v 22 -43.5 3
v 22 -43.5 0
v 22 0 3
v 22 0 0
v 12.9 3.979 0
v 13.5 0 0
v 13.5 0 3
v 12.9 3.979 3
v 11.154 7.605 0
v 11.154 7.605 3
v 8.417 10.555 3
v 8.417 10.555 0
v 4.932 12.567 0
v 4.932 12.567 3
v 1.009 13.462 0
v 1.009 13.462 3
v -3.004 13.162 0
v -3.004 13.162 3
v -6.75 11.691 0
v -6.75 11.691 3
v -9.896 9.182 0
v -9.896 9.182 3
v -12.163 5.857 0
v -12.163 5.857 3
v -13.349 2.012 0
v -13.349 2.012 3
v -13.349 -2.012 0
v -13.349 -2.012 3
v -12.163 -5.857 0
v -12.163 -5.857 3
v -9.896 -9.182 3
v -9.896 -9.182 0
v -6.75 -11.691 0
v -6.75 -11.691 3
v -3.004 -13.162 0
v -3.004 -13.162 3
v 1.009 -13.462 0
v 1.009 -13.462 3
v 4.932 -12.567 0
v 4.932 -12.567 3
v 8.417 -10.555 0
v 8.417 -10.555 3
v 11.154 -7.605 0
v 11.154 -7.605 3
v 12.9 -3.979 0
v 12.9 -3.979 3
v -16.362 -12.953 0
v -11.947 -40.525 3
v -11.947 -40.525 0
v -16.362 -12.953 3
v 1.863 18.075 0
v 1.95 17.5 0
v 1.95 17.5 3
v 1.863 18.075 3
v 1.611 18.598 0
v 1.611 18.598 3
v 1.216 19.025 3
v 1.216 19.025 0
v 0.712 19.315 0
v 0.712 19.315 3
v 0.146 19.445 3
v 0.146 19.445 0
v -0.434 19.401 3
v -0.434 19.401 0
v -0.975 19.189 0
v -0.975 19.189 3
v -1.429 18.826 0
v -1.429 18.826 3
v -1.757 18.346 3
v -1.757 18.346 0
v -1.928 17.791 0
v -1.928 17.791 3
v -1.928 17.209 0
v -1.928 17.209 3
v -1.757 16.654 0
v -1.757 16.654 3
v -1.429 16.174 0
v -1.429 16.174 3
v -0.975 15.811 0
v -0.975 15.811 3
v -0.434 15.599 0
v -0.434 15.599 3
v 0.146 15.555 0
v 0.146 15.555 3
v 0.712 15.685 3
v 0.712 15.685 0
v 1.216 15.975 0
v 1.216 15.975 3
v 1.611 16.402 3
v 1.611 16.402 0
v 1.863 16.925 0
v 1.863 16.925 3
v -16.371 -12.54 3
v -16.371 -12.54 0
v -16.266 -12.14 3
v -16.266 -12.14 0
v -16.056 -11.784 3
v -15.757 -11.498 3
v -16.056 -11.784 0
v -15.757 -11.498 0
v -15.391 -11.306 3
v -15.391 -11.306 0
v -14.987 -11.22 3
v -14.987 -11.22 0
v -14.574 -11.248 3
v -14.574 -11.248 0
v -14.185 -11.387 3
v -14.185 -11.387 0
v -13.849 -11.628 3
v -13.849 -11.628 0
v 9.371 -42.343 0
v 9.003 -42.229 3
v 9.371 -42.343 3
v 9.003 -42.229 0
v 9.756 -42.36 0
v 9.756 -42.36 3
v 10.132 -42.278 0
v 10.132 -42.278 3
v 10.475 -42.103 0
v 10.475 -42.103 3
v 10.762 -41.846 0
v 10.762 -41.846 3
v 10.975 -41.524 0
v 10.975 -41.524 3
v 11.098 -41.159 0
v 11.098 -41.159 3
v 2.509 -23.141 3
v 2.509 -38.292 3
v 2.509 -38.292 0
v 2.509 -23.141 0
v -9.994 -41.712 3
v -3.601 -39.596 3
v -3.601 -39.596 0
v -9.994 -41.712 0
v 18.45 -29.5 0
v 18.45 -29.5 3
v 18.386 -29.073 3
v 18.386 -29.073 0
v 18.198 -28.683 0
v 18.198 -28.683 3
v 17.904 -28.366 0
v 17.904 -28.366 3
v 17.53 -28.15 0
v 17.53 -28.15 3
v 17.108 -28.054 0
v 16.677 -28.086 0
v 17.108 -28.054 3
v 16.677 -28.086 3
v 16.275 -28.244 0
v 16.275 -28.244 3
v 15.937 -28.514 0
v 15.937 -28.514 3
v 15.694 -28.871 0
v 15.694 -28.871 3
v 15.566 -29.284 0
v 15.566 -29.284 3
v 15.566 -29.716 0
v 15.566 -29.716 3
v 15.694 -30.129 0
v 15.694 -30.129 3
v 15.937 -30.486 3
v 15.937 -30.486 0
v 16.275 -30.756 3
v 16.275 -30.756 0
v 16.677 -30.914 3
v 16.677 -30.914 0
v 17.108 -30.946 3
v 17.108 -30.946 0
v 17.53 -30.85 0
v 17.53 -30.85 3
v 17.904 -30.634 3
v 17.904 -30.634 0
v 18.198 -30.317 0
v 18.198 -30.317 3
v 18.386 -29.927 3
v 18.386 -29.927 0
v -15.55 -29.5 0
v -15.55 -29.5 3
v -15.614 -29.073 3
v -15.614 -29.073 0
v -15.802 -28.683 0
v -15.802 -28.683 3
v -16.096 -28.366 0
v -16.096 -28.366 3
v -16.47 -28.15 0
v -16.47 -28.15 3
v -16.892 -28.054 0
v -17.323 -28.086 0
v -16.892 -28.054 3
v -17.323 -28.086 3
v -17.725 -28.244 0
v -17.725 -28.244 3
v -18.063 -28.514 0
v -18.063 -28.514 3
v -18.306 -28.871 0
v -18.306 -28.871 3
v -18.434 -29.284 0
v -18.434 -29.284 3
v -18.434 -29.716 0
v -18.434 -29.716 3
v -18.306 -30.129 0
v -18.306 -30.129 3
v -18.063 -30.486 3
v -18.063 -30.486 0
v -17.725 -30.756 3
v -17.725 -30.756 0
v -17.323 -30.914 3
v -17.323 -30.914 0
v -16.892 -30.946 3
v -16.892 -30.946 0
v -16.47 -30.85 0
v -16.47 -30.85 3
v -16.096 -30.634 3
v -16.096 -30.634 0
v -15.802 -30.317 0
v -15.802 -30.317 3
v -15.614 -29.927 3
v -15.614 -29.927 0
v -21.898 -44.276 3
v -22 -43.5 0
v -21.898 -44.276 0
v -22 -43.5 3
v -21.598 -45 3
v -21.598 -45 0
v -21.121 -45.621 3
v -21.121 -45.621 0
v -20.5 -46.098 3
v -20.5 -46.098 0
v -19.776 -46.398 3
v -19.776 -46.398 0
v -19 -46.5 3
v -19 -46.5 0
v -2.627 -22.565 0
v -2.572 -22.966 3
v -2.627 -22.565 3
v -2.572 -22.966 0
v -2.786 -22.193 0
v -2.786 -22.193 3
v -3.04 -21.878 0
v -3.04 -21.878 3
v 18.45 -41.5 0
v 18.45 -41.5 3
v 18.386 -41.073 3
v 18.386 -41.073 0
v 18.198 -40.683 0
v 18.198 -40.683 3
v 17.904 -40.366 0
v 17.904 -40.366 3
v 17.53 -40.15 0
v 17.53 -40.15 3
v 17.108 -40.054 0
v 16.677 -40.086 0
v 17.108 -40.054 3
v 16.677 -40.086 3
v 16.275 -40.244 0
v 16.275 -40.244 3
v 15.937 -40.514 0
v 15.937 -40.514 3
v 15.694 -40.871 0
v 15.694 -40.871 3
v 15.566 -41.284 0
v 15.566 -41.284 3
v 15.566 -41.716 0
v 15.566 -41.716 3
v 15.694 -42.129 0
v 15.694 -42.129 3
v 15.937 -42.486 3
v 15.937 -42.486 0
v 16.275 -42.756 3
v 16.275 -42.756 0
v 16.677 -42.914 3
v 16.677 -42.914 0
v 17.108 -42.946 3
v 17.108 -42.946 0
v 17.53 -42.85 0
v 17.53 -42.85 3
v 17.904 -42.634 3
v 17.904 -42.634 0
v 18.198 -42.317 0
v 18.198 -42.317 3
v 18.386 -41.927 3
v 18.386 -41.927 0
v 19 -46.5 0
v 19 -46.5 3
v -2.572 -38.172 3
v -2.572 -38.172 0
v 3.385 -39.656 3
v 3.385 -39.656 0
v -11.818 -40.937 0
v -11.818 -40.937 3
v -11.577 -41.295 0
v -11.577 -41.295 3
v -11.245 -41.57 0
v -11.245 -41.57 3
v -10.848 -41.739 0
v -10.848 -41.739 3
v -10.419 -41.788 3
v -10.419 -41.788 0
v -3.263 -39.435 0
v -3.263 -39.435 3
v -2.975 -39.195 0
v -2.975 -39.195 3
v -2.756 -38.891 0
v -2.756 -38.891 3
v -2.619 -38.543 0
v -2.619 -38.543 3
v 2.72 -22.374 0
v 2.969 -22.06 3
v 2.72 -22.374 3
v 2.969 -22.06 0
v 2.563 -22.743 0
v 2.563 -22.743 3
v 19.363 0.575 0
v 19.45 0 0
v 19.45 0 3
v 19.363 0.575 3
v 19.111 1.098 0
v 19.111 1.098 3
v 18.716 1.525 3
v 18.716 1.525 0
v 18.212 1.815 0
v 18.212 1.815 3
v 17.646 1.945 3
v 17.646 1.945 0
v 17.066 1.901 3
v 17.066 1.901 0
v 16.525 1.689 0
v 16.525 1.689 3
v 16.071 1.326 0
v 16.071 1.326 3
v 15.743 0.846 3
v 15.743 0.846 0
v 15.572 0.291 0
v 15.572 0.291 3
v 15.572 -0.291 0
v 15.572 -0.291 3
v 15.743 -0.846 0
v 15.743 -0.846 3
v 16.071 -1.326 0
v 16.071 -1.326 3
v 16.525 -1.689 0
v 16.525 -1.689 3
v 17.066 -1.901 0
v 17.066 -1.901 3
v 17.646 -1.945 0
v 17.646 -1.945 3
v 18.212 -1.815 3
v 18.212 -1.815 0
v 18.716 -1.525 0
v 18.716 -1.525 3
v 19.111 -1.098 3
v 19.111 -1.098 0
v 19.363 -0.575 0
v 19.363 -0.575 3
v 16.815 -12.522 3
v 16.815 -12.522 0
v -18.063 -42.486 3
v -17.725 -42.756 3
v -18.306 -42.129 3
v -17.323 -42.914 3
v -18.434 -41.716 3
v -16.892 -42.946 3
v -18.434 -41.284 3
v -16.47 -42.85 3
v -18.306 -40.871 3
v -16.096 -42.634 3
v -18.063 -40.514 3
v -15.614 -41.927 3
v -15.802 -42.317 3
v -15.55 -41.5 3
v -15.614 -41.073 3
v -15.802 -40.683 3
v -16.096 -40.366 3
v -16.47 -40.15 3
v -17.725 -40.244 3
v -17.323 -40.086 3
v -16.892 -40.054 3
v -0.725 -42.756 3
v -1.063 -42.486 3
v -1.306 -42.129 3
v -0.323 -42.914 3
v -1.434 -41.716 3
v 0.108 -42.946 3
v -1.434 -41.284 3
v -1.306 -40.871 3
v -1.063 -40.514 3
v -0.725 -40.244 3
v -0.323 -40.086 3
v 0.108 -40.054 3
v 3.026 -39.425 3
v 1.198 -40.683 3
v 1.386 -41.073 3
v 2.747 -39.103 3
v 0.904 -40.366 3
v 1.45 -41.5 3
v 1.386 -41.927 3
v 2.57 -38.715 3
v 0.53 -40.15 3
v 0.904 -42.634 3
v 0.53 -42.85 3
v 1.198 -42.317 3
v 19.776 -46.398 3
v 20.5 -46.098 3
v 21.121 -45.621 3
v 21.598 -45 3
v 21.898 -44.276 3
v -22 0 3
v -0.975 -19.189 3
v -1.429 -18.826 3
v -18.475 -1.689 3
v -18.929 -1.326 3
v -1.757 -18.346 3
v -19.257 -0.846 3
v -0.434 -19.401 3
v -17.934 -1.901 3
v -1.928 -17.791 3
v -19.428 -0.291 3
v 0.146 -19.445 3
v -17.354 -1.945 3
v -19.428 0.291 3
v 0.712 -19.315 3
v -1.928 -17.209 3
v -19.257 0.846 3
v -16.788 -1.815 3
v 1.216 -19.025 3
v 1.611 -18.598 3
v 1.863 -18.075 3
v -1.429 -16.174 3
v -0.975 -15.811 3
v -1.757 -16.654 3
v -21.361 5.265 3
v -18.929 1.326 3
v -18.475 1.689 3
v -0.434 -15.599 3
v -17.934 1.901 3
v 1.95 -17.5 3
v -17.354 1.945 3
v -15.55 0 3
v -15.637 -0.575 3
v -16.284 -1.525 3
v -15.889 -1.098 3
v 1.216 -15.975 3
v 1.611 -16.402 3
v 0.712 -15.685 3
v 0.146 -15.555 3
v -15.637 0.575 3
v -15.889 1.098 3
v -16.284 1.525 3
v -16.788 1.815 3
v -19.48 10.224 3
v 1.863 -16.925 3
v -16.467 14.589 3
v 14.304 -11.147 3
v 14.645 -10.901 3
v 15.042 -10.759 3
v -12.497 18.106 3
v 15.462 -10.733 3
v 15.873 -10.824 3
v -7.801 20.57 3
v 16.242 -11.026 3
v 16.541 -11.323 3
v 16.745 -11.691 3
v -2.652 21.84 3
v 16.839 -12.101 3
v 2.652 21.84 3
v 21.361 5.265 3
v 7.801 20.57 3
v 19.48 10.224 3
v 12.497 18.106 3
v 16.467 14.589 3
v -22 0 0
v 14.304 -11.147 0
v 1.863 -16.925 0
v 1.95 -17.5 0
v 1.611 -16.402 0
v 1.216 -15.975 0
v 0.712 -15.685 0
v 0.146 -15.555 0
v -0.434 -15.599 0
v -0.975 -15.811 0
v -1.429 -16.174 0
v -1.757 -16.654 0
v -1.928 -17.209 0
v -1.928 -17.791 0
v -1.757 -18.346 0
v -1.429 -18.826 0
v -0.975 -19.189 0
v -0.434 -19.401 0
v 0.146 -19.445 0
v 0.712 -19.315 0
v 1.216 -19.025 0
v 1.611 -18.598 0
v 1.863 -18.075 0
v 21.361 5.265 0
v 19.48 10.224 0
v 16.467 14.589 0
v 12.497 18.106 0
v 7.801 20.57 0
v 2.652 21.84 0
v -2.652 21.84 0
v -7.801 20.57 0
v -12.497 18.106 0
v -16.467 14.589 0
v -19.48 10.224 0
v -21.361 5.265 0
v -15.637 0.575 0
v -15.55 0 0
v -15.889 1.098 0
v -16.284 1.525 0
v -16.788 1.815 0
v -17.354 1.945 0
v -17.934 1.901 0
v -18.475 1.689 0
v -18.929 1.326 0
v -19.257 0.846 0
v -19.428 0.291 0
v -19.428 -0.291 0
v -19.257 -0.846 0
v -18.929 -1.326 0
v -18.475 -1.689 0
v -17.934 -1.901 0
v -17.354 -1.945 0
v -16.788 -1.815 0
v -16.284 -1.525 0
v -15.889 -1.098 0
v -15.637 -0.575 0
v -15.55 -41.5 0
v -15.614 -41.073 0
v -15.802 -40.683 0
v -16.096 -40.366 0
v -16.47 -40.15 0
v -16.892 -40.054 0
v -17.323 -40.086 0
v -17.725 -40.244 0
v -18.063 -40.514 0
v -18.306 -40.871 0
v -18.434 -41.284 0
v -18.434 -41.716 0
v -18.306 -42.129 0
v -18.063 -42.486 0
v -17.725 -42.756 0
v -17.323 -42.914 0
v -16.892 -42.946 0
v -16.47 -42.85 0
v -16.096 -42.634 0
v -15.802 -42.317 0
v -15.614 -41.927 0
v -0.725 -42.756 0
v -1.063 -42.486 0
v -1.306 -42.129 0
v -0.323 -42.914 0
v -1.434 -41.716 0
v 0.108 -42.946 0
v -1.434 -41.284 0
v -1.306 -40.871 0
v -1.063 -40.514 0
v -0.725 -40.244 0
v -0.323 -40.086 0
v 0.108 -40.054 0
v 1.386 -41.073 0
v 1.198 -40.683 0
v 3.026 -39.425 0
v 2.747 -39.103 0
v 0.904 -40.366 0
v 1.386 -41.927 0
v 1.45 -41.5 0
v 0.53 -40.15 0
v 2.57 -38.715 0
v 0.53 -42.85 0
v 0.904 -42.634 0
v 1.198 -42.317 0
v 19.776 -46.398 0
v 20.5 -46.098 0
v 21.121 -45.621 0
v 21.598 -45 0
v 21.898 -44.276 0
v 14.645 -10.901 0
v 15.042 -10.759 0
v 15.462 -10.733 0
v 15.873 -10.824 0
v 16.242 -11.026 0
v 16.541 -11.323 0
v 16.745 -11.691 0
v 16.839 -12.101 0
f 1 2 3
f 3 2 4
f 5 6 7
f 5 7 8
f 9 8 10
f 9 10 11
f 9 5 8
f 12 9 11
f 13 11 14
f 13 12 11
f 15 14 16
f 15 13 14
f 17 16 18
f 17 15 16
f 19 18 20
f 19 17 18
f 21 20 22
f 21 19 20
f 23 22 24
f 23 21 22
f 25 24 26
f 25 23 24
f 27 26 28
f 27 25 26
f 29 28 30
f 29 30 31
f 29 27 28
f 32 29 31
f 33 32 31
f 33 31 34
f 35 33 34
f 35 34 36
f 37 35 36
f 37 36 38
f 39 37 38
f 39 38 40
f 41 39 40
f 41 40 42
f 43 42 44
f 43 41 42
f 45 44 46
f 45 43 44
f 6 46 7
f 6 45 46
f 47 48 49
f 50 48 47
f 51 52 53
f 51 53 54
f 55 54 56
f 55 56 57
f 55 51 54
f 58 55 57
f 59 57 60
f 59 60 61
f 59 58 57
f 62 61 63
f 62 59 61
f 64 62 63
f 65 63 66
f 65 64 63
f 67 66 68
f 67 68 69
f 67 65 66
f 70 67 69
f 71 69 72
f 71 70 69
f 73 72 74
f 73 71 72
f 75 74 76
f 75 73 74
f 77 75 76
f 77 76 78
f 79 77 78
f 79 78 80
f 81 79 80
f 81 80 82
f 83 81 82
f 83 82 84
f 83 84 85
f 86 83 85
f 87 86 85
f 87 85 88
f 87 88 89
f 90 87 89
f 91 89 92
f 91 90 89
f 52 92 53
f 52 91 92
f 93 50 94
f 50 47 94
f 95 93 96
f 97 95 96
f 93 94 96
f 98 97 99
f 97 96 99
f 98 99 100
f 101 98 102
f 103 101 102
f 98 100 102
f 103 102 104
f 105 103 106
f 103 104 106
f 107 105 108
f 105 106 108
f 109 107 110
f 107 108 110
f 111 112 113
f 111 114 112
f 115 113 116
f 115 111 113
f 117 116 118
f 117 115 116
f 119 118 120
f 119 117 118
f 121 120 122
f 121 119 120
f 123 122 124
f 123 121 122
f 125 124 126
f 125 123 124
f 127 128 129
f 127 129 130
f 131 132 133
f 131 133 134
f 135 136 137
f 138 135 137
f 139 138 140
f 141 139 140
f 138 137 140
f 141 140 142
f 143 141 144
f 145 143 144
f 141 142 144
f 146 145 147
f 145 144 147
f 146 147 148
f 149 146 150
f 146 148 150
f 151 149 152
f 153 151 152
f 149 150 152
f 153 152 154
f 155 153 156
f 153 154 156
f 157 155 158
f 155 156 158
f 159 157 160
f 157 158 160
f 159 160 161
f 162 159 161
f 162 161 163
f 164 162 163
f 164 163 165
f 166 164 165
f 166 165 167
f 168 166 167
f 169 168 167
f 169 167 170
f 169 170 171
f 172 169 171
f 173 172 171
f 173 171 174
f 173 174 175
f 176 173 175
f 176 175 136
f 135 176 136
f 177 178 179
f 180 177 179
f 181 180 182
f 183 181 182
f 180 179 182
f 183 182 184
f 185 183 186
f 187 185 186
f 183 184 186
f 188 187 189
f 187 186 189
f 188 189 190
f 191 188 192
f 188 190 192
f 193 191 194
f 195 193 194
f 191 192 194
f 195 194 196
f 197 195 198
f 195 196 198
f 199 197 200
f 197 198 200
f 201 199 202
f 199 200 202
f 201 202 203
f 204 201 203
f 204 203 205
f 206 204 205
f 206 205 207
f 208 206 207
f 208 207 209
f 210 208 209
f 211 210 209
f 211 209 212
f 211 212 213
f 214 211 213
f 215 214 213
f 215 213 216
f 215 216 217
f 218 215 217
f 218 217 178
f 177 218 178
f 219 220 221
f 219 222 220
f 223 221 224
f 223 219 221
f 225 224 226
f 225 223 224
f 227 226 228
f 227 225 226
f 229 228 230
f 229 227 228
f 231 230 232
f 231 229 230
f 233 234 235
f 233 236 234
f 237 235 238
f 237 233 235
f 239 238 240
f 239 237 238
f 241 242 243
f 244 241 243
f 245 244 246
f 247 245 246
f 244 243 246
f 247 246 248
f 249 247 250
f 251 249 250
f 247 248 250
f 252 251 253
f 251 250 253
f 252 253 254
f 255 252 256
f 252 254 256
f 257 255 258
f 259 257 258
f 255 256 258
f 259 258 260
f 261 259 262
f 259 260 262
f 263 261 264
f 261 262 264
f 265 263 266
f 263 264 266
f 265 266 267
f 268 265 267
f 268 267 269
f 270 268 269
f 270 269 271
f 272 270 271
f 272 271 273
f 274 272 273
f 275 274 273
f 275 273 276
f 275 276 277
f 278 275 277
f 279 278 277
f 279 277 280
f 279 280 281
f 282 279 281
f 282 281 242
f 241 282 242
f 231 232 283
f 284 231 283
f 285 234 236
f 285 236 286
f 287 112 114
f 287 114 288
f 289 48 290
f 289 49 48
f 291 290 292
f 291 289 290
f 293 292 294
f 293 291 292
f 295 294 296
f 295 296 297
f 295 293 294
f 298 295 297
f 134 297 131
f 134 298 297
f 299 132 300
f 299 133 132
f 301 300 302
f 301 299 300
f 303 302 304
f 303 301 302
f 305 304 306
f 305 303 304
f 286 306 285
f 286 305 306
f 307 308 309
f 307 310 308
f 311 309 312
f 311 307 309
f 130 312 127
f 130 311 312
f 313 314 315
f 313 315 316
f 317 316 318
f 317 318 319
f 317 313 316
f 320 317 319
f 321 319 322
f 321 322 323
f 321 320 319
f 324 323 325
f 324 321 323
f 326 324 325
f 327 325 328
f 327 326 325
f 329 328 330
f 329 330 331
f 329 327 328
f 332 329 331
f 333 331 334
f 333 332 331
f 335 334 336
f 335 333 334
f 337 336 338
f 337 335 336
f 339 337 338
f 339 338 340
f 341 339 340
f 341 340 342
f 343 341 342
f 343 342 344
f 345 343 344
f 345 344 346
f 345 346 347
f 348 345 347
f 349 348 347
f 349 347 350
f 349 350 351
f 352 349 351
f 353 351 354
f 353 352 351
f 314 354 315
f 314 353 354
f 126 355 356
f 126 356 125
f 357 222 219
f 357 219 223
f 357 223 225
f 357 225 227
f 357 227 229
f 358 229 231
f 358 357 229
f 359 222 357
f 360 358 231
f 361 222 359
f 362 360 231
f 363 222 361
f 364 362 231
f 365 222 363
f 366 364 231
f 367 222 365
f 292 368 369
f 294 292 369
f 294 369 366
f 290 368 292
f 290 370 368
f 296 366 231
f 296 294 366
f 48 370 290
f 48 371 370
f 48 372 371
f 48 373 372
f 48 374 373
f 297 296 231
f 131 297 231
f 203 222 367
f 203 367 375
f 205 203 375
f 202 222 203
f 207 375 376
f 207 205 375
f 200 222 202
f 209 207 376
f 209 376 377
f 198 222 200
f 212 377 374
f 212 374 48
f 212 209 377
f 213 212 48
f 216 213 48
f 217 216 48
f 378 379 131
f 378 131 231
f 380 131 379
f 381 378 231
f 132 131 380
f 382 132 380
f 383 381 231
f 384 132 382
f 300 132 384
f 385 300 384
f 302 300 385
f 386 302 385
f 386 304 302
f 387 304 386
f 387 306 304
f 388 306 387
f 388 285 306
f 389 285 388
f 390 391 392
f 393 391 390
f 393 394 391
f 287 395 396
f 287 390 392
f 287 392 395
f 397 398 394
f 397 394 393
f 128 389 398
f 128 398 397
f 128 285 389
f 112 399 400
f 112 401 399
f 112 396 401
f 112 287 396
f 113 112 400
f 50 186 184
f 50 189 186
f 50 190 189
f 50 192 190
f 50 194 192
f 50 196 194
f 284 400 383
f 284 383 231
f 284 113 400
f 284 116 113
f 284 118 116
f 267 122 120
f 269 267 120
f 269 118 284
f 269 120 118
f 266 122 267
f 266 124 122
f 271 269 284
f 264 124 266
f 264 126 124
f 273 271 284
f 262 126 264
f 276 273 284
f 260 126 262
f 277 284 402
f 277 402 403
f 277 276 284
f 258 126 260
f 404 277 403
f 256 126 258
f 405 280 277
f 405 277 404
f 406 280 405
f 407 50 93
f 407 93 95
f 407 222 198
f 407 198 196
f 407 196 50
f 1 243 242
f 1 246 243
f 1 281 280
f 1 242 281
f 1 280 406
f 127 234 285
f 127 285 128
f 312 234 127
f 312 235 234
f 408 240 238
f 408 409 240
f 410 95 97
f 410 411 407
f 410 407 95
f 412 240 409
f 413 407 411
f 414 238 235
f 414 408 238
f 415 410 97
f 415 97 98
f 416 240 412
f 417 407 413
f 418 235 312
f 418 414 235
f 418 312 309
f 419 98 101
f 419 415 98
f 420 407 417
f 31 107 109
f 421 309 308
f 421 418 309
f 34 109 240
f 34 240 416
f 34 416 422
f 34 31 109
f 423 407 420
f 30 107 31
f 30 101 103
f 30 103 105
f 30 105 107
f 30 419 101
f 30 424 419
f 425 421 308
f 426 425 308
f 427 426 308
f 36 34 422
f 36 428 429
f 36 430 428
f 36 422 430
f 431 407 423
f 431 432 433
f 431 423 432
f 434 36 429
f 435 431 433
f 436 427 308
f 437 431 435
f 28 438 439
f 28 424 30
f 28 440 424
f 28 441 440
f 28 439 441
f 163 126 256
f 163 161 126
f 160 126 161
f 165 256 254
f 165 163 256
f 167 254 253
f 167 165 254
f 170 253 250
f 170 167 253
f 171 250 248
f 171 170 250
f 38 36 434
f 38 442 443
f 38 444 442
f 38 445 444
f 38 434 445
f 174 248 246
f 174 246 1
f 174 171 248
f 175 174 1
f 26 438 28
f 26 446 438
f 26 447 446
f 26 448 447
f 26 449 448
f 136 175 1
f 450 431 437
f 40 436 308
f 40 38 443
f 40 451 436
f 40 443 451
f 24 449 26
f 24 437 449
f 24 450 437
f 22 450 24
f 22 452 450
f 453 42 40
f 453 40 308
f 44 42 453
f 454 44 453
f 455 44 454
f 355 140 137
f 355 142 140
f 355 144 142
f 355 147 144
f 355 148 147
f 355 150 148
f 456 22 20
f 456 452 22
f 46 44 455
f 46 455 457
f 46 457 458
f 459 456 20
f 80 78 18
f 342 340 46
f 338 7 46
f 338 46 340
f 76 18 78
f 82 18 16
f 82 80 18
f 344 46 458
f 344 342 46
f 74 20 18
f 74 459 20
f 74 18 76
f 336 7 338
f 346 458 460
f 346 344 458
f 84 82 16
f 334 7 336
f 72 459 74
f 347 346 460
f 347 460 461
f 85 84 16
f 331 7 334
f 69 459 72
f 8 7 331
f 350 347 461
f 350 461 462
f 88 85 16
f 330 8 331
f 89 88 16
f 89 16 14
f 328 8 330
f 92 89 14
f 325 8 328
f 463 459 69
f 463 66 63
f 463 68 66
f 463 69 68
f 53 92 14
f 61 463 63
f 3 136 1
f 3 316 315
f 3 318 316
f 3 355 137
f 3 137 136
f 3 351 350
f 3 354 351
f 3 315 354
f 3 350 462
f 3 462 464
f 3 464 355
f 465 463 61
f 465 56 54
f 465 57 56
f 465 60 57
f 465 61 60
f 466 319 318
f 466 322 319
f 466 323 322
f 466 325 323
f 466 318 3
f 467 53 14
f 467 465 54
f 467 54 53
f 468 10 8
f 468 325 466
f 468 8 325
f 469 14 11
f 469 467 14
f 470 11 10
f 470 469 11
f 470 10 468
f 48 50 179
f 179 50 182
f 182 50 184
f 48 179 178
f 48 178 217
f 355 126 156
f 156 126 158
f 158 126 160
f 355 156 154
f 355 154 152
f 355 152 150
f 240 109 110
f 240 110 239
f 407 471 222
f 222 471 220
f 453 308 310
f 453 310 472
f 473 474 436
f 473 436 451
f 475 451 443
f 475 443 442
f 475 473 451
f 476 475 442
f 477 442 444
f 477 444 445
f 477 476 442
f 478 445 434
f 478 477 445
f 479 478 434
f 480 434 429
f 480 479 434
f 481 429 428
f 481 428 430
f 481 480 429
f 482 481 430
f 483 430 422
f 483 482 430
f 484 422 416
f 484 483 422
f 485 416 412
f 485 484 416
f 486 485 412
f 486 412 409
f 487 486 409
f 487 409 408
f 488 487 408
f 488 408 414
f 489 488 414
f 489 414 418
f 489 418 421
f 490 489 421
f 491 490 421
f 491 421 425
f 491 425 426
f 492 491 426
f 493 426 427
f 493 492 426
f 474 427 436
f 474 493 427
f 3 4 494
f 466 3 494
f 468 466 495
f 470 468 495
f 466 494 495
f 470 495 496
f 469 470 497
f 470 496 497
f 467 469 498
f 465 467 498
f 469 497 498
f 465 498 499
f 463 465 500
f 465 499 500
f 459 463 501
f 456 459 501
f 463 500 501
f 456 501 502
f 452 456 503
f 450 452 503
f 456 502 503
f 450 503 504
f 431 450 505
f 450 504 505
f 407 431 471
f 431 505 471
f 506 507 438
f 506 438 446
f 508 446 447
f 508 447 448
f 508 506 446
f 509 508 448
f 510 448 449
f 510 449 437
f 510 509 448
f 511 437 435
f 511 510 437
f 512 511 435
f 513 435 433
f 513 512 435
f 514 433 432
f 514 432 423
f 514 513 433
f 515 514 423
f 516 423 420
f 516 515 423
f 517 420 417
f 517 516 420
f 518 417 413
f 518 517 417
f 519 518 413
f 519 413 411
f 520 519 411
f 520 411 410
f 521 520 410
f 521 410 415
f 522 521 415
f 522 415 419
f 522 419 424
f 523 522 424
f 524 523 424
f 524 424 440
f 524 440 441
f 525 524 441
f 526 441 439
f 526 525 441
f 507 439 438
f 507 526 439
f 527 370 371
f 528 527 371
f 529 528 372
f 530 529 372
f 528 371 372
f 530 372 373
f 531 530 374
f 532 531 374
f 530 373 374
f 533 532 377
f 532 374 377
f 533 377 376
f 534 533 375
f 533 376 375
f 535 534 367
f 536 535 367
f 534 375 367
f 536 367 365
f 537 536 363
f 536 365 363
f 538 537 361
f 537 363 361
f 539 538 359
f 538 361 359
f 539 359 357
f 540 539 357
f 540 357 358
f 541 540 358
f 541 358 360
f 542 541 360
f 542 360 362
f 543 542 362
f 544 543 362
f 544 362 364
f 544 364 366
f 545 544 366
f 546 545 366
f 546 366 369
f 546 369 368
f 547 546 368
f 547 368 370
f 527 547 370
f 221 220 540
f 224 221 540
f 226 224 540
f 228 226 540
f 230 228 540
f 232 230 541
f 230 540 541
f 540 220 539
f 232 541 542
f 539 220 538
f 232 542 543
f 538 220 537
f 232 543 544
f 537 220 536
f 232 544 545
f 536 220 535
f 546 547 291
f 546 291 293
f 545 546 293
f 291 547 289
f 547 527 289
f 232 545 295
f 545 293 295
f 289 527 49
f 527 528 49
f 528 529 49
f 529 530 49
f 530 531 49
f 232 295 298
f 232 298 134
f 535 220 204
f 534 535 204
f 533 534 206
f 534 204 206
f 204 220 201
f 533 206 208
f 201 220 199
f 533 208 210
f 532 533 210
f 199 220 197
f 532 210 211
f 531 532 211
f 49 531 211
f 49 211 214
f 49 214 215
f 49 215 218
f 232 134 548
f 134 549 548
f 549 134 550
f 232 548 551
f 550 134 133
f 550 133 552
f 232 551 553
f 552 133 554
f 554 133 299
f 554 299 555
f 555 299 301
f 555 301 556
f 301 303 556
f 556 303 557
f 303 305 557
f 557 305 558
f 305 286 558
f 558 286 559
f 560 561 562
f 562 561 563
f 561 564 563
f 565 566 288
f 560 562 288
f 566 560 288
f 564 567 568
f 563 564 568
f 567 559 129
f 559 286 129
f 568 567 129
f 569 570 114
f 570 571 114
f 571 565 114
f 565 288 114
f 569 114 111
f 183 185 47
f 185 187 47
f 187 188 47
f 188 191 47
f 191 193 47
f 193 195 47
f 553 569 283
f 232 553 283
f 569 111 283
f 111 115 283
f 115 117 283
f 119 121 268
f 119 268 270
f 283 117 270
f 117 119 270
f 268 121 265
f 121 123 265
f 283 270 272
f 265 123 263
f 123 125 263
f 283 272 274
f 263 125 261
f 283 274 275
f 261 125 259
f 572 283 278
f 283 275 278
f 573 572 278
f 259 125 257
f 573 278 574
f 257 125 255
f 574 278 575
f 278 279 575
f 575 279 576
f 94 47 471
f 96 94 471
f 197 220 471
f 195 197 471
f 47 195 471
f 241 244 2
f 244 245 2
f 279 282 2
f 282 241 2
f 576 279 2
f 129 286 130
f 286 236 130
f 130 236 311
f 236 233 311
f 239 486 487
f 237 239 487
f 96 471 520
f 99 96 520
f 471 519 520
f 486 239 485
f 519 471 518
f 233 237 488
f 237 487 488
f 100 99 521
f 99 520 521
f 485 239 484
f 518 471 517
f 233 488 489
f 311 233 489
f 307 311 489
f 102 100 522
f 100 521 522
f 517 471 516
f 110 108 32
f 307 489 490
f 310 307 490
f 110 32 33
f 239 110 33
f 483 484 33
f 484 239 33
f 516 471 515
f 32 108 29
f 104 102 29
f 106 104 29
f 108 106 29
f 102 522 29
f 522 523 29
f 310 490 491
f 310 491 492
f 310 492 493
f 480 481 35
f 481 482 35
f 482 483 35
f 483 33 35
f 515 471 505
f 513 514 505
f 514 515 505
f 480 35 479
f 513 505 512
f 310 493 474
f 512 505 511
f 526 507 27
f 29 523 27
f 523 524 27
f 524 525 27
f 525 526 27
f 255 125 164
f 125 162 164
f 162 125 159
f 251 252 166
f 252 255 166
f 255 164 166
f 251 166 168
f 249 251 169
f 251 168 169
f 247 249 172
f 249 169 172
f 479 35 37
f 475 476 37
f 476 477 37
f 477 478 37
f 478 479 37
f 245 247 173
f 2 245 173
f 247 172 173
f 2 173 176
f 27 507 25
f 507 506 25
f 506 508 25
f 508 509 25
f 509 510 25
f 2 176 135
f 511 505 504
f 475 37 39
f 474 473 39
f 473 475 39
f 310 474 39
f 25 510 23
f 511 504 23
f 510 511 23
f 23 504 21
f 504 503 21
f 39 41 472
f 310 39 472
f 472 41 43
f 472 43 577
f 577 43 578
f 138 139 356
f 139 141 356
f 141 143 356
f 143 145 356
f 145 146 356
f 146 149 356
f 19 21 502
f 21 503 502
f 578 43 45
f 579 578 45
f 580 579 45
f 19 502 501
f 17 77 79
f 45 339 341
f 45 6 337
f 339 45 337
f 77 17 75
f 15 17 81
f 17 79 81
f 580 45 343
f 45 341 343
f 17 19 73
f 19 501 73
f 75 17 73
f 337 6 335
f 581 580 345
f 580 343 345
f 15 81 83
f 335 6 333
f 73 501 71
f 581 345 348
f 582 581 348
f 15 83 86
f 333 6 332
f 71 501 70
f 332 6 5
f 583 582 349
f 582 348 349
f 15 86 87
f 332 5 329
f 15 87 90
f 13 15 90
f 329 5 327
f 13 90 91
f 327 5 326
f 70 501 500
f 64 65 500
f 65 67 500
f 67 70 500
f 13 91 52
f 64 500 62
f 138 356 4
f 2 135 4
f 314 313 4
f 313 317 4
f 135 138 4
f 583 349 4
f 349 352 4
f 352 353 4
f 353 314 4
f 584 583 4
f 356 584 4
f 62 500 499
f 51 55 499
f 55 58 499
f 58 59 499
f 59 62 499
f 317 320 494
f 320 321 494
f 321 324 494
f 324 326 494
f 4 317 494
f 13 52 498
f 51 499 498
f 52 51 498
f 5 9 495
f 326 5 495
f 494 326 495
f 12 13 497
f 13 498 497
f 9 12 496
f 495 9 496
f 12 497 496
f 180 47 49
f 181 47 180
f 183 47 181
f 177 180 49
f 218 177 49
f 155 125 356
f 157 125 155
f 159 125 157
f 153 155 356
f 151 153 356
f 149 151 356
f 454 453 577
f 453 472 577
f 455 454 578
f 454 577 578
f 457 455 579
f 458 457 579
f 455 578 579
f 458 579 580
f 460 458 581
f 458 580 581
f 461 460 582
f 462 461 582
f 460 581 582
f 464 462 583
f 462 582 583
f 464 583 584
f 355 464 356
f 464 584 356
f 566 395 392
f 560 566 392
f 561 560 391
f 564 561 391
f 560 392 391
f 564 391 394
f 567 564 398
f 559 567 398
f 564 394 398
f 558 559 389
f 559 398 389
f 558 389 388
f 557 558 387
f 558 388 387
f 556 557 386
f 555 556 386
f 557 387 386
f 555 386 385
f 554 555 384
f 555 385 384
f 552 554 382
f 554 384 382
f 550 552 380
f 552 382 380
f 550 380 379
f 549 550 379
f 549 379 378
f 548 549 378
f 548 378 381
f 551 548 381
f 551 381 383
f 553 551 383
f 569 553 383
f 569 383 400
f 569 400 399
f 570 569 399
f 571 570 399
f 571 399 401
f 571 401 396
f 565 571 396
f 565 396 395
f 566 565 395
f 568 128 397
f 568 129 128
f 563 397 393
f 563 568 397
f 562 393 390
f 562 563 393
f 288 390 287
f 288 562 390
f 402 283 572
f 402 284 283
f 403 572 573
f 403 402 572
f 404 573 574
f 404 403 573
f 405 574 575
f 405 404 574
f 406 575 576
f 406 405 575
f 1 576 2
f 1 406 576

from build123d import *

# Parameters (mm, degrees)
SKETCH_1_R          = 13.5
SKETCH_1_R_2        = 1.95
EXTRUDE_1_DEPTH     = 3
SKETCH_2_R          = 1.45
CUT_EXTRUDE_1_DEPTH = 10
FILLET_1_R          = 3
CUT_EXTRUDE_2_DEPTH = 52.529117982
FILLET_2_R          = 1.5


with BuildPart() as part:
    # 草图1 → 凸台-拉伸1 (new body)
    with BuildSketch(Plane.XY):
        with BuildLine():
            Line((-22, 0), (-22, -46.5))
            Line((-22, -46.5), (22, -46.5))
            Line((22, -46.5), (22, 0))
            ThreePointArc((22, 0), (0, 22), (-22, 0))
        make_face()
        Circle(SKETCH_1_R, mode=Mode.SUBTRACT)
        with Locations((0, 17.5)):
            Circle(SKETCH_1_R_2, mode=Mode.SUBTRACT)
        with Locations((17.5, 0)):
            Circle(SKETCH_1_R_2, mode=Mode.SUBTRACT)
        with Locations((-17.5, 0)):
            Circle(SKETCH_1_R_2, mode=Mode.SUBTRACT)
        with Locations((0, -17.5)):
            Circle(SKETCH_1_R_2, mode=Mode.SUBTRACT)
    extrude(amount=EXTRUDE_1_DEPTH)

    # 草图2 → 切除-拉伸1 (cut)
    with BuildSketch(Plane.XY.offset(3)):
        with Locations((0, -41.5)):
            Circle(SKETCH_2_R)
        with Locations((17, -41.5)):
            Circle(SKETCH_2_R)
        with Locations((-17, -41.5)):
            Circle(SKETCH_2_R)
        with Locations((-17, -29.5)):
            Circle(SKETCH_2_R)
        with Locations((17, -29.5)):
            Circle(SKETCH_2_R)
    extrude(amount=-CUT_EXTRUDE_1_DEPTH, mode=Mode.SUBTRACT)

    # 圆角1
    fillet_1_edges = [part.edges().sort_by_distance(p)[0] for p in [
        (22, -46.5, 1.5),
        (-22, -46.5, 1.5),
    ]]
    fillet(fillet_1_edges, radius=FILLET_1_R)

    # 草图3 → 切除-拉伸2 (cut, through all)
    with BuildSketch(Plane.XY.offset(3)):
        Polygon((17.752585541, -7.827536111), (10.726827306, -43.019057271), (2.50919937, -39.255258217), (2.50919937, -22.502580513), align=None)
        Polygon((-17.062555714, -8.580295922), (-2.571929354, -22.321407125), (-2.571929354, -39.255258217), (-11.667777069, -42.266297461), align=None)
    extrude(amount=-CUT_EXTRUDE_2_DEPTH, mode=Mode.SUBTRACT)

    # 圆角2
    fillet_2_edges = [part.edges().sort_by_distance(p)[0] for p in [
        (2.50919937, -22.502580513, 1.5),
        (17.752585541, -7.827536111, 1.5),
        (10.726827306, -43.019057271, 1.5),
        (2.50919937, -39.255258217, 1.5),
        (-11.667777069, -42.266297461, 1.5),
        (-17.062555714, -8.580295922, 1.5),
        (-2.571929354, -22.321407125, 1.5),
        (-2.571929354, -39.255258217, 1.5),
    ]]
    fillet(fillet_2_edges, radius=FILLET_2_R)


solid = part.part
